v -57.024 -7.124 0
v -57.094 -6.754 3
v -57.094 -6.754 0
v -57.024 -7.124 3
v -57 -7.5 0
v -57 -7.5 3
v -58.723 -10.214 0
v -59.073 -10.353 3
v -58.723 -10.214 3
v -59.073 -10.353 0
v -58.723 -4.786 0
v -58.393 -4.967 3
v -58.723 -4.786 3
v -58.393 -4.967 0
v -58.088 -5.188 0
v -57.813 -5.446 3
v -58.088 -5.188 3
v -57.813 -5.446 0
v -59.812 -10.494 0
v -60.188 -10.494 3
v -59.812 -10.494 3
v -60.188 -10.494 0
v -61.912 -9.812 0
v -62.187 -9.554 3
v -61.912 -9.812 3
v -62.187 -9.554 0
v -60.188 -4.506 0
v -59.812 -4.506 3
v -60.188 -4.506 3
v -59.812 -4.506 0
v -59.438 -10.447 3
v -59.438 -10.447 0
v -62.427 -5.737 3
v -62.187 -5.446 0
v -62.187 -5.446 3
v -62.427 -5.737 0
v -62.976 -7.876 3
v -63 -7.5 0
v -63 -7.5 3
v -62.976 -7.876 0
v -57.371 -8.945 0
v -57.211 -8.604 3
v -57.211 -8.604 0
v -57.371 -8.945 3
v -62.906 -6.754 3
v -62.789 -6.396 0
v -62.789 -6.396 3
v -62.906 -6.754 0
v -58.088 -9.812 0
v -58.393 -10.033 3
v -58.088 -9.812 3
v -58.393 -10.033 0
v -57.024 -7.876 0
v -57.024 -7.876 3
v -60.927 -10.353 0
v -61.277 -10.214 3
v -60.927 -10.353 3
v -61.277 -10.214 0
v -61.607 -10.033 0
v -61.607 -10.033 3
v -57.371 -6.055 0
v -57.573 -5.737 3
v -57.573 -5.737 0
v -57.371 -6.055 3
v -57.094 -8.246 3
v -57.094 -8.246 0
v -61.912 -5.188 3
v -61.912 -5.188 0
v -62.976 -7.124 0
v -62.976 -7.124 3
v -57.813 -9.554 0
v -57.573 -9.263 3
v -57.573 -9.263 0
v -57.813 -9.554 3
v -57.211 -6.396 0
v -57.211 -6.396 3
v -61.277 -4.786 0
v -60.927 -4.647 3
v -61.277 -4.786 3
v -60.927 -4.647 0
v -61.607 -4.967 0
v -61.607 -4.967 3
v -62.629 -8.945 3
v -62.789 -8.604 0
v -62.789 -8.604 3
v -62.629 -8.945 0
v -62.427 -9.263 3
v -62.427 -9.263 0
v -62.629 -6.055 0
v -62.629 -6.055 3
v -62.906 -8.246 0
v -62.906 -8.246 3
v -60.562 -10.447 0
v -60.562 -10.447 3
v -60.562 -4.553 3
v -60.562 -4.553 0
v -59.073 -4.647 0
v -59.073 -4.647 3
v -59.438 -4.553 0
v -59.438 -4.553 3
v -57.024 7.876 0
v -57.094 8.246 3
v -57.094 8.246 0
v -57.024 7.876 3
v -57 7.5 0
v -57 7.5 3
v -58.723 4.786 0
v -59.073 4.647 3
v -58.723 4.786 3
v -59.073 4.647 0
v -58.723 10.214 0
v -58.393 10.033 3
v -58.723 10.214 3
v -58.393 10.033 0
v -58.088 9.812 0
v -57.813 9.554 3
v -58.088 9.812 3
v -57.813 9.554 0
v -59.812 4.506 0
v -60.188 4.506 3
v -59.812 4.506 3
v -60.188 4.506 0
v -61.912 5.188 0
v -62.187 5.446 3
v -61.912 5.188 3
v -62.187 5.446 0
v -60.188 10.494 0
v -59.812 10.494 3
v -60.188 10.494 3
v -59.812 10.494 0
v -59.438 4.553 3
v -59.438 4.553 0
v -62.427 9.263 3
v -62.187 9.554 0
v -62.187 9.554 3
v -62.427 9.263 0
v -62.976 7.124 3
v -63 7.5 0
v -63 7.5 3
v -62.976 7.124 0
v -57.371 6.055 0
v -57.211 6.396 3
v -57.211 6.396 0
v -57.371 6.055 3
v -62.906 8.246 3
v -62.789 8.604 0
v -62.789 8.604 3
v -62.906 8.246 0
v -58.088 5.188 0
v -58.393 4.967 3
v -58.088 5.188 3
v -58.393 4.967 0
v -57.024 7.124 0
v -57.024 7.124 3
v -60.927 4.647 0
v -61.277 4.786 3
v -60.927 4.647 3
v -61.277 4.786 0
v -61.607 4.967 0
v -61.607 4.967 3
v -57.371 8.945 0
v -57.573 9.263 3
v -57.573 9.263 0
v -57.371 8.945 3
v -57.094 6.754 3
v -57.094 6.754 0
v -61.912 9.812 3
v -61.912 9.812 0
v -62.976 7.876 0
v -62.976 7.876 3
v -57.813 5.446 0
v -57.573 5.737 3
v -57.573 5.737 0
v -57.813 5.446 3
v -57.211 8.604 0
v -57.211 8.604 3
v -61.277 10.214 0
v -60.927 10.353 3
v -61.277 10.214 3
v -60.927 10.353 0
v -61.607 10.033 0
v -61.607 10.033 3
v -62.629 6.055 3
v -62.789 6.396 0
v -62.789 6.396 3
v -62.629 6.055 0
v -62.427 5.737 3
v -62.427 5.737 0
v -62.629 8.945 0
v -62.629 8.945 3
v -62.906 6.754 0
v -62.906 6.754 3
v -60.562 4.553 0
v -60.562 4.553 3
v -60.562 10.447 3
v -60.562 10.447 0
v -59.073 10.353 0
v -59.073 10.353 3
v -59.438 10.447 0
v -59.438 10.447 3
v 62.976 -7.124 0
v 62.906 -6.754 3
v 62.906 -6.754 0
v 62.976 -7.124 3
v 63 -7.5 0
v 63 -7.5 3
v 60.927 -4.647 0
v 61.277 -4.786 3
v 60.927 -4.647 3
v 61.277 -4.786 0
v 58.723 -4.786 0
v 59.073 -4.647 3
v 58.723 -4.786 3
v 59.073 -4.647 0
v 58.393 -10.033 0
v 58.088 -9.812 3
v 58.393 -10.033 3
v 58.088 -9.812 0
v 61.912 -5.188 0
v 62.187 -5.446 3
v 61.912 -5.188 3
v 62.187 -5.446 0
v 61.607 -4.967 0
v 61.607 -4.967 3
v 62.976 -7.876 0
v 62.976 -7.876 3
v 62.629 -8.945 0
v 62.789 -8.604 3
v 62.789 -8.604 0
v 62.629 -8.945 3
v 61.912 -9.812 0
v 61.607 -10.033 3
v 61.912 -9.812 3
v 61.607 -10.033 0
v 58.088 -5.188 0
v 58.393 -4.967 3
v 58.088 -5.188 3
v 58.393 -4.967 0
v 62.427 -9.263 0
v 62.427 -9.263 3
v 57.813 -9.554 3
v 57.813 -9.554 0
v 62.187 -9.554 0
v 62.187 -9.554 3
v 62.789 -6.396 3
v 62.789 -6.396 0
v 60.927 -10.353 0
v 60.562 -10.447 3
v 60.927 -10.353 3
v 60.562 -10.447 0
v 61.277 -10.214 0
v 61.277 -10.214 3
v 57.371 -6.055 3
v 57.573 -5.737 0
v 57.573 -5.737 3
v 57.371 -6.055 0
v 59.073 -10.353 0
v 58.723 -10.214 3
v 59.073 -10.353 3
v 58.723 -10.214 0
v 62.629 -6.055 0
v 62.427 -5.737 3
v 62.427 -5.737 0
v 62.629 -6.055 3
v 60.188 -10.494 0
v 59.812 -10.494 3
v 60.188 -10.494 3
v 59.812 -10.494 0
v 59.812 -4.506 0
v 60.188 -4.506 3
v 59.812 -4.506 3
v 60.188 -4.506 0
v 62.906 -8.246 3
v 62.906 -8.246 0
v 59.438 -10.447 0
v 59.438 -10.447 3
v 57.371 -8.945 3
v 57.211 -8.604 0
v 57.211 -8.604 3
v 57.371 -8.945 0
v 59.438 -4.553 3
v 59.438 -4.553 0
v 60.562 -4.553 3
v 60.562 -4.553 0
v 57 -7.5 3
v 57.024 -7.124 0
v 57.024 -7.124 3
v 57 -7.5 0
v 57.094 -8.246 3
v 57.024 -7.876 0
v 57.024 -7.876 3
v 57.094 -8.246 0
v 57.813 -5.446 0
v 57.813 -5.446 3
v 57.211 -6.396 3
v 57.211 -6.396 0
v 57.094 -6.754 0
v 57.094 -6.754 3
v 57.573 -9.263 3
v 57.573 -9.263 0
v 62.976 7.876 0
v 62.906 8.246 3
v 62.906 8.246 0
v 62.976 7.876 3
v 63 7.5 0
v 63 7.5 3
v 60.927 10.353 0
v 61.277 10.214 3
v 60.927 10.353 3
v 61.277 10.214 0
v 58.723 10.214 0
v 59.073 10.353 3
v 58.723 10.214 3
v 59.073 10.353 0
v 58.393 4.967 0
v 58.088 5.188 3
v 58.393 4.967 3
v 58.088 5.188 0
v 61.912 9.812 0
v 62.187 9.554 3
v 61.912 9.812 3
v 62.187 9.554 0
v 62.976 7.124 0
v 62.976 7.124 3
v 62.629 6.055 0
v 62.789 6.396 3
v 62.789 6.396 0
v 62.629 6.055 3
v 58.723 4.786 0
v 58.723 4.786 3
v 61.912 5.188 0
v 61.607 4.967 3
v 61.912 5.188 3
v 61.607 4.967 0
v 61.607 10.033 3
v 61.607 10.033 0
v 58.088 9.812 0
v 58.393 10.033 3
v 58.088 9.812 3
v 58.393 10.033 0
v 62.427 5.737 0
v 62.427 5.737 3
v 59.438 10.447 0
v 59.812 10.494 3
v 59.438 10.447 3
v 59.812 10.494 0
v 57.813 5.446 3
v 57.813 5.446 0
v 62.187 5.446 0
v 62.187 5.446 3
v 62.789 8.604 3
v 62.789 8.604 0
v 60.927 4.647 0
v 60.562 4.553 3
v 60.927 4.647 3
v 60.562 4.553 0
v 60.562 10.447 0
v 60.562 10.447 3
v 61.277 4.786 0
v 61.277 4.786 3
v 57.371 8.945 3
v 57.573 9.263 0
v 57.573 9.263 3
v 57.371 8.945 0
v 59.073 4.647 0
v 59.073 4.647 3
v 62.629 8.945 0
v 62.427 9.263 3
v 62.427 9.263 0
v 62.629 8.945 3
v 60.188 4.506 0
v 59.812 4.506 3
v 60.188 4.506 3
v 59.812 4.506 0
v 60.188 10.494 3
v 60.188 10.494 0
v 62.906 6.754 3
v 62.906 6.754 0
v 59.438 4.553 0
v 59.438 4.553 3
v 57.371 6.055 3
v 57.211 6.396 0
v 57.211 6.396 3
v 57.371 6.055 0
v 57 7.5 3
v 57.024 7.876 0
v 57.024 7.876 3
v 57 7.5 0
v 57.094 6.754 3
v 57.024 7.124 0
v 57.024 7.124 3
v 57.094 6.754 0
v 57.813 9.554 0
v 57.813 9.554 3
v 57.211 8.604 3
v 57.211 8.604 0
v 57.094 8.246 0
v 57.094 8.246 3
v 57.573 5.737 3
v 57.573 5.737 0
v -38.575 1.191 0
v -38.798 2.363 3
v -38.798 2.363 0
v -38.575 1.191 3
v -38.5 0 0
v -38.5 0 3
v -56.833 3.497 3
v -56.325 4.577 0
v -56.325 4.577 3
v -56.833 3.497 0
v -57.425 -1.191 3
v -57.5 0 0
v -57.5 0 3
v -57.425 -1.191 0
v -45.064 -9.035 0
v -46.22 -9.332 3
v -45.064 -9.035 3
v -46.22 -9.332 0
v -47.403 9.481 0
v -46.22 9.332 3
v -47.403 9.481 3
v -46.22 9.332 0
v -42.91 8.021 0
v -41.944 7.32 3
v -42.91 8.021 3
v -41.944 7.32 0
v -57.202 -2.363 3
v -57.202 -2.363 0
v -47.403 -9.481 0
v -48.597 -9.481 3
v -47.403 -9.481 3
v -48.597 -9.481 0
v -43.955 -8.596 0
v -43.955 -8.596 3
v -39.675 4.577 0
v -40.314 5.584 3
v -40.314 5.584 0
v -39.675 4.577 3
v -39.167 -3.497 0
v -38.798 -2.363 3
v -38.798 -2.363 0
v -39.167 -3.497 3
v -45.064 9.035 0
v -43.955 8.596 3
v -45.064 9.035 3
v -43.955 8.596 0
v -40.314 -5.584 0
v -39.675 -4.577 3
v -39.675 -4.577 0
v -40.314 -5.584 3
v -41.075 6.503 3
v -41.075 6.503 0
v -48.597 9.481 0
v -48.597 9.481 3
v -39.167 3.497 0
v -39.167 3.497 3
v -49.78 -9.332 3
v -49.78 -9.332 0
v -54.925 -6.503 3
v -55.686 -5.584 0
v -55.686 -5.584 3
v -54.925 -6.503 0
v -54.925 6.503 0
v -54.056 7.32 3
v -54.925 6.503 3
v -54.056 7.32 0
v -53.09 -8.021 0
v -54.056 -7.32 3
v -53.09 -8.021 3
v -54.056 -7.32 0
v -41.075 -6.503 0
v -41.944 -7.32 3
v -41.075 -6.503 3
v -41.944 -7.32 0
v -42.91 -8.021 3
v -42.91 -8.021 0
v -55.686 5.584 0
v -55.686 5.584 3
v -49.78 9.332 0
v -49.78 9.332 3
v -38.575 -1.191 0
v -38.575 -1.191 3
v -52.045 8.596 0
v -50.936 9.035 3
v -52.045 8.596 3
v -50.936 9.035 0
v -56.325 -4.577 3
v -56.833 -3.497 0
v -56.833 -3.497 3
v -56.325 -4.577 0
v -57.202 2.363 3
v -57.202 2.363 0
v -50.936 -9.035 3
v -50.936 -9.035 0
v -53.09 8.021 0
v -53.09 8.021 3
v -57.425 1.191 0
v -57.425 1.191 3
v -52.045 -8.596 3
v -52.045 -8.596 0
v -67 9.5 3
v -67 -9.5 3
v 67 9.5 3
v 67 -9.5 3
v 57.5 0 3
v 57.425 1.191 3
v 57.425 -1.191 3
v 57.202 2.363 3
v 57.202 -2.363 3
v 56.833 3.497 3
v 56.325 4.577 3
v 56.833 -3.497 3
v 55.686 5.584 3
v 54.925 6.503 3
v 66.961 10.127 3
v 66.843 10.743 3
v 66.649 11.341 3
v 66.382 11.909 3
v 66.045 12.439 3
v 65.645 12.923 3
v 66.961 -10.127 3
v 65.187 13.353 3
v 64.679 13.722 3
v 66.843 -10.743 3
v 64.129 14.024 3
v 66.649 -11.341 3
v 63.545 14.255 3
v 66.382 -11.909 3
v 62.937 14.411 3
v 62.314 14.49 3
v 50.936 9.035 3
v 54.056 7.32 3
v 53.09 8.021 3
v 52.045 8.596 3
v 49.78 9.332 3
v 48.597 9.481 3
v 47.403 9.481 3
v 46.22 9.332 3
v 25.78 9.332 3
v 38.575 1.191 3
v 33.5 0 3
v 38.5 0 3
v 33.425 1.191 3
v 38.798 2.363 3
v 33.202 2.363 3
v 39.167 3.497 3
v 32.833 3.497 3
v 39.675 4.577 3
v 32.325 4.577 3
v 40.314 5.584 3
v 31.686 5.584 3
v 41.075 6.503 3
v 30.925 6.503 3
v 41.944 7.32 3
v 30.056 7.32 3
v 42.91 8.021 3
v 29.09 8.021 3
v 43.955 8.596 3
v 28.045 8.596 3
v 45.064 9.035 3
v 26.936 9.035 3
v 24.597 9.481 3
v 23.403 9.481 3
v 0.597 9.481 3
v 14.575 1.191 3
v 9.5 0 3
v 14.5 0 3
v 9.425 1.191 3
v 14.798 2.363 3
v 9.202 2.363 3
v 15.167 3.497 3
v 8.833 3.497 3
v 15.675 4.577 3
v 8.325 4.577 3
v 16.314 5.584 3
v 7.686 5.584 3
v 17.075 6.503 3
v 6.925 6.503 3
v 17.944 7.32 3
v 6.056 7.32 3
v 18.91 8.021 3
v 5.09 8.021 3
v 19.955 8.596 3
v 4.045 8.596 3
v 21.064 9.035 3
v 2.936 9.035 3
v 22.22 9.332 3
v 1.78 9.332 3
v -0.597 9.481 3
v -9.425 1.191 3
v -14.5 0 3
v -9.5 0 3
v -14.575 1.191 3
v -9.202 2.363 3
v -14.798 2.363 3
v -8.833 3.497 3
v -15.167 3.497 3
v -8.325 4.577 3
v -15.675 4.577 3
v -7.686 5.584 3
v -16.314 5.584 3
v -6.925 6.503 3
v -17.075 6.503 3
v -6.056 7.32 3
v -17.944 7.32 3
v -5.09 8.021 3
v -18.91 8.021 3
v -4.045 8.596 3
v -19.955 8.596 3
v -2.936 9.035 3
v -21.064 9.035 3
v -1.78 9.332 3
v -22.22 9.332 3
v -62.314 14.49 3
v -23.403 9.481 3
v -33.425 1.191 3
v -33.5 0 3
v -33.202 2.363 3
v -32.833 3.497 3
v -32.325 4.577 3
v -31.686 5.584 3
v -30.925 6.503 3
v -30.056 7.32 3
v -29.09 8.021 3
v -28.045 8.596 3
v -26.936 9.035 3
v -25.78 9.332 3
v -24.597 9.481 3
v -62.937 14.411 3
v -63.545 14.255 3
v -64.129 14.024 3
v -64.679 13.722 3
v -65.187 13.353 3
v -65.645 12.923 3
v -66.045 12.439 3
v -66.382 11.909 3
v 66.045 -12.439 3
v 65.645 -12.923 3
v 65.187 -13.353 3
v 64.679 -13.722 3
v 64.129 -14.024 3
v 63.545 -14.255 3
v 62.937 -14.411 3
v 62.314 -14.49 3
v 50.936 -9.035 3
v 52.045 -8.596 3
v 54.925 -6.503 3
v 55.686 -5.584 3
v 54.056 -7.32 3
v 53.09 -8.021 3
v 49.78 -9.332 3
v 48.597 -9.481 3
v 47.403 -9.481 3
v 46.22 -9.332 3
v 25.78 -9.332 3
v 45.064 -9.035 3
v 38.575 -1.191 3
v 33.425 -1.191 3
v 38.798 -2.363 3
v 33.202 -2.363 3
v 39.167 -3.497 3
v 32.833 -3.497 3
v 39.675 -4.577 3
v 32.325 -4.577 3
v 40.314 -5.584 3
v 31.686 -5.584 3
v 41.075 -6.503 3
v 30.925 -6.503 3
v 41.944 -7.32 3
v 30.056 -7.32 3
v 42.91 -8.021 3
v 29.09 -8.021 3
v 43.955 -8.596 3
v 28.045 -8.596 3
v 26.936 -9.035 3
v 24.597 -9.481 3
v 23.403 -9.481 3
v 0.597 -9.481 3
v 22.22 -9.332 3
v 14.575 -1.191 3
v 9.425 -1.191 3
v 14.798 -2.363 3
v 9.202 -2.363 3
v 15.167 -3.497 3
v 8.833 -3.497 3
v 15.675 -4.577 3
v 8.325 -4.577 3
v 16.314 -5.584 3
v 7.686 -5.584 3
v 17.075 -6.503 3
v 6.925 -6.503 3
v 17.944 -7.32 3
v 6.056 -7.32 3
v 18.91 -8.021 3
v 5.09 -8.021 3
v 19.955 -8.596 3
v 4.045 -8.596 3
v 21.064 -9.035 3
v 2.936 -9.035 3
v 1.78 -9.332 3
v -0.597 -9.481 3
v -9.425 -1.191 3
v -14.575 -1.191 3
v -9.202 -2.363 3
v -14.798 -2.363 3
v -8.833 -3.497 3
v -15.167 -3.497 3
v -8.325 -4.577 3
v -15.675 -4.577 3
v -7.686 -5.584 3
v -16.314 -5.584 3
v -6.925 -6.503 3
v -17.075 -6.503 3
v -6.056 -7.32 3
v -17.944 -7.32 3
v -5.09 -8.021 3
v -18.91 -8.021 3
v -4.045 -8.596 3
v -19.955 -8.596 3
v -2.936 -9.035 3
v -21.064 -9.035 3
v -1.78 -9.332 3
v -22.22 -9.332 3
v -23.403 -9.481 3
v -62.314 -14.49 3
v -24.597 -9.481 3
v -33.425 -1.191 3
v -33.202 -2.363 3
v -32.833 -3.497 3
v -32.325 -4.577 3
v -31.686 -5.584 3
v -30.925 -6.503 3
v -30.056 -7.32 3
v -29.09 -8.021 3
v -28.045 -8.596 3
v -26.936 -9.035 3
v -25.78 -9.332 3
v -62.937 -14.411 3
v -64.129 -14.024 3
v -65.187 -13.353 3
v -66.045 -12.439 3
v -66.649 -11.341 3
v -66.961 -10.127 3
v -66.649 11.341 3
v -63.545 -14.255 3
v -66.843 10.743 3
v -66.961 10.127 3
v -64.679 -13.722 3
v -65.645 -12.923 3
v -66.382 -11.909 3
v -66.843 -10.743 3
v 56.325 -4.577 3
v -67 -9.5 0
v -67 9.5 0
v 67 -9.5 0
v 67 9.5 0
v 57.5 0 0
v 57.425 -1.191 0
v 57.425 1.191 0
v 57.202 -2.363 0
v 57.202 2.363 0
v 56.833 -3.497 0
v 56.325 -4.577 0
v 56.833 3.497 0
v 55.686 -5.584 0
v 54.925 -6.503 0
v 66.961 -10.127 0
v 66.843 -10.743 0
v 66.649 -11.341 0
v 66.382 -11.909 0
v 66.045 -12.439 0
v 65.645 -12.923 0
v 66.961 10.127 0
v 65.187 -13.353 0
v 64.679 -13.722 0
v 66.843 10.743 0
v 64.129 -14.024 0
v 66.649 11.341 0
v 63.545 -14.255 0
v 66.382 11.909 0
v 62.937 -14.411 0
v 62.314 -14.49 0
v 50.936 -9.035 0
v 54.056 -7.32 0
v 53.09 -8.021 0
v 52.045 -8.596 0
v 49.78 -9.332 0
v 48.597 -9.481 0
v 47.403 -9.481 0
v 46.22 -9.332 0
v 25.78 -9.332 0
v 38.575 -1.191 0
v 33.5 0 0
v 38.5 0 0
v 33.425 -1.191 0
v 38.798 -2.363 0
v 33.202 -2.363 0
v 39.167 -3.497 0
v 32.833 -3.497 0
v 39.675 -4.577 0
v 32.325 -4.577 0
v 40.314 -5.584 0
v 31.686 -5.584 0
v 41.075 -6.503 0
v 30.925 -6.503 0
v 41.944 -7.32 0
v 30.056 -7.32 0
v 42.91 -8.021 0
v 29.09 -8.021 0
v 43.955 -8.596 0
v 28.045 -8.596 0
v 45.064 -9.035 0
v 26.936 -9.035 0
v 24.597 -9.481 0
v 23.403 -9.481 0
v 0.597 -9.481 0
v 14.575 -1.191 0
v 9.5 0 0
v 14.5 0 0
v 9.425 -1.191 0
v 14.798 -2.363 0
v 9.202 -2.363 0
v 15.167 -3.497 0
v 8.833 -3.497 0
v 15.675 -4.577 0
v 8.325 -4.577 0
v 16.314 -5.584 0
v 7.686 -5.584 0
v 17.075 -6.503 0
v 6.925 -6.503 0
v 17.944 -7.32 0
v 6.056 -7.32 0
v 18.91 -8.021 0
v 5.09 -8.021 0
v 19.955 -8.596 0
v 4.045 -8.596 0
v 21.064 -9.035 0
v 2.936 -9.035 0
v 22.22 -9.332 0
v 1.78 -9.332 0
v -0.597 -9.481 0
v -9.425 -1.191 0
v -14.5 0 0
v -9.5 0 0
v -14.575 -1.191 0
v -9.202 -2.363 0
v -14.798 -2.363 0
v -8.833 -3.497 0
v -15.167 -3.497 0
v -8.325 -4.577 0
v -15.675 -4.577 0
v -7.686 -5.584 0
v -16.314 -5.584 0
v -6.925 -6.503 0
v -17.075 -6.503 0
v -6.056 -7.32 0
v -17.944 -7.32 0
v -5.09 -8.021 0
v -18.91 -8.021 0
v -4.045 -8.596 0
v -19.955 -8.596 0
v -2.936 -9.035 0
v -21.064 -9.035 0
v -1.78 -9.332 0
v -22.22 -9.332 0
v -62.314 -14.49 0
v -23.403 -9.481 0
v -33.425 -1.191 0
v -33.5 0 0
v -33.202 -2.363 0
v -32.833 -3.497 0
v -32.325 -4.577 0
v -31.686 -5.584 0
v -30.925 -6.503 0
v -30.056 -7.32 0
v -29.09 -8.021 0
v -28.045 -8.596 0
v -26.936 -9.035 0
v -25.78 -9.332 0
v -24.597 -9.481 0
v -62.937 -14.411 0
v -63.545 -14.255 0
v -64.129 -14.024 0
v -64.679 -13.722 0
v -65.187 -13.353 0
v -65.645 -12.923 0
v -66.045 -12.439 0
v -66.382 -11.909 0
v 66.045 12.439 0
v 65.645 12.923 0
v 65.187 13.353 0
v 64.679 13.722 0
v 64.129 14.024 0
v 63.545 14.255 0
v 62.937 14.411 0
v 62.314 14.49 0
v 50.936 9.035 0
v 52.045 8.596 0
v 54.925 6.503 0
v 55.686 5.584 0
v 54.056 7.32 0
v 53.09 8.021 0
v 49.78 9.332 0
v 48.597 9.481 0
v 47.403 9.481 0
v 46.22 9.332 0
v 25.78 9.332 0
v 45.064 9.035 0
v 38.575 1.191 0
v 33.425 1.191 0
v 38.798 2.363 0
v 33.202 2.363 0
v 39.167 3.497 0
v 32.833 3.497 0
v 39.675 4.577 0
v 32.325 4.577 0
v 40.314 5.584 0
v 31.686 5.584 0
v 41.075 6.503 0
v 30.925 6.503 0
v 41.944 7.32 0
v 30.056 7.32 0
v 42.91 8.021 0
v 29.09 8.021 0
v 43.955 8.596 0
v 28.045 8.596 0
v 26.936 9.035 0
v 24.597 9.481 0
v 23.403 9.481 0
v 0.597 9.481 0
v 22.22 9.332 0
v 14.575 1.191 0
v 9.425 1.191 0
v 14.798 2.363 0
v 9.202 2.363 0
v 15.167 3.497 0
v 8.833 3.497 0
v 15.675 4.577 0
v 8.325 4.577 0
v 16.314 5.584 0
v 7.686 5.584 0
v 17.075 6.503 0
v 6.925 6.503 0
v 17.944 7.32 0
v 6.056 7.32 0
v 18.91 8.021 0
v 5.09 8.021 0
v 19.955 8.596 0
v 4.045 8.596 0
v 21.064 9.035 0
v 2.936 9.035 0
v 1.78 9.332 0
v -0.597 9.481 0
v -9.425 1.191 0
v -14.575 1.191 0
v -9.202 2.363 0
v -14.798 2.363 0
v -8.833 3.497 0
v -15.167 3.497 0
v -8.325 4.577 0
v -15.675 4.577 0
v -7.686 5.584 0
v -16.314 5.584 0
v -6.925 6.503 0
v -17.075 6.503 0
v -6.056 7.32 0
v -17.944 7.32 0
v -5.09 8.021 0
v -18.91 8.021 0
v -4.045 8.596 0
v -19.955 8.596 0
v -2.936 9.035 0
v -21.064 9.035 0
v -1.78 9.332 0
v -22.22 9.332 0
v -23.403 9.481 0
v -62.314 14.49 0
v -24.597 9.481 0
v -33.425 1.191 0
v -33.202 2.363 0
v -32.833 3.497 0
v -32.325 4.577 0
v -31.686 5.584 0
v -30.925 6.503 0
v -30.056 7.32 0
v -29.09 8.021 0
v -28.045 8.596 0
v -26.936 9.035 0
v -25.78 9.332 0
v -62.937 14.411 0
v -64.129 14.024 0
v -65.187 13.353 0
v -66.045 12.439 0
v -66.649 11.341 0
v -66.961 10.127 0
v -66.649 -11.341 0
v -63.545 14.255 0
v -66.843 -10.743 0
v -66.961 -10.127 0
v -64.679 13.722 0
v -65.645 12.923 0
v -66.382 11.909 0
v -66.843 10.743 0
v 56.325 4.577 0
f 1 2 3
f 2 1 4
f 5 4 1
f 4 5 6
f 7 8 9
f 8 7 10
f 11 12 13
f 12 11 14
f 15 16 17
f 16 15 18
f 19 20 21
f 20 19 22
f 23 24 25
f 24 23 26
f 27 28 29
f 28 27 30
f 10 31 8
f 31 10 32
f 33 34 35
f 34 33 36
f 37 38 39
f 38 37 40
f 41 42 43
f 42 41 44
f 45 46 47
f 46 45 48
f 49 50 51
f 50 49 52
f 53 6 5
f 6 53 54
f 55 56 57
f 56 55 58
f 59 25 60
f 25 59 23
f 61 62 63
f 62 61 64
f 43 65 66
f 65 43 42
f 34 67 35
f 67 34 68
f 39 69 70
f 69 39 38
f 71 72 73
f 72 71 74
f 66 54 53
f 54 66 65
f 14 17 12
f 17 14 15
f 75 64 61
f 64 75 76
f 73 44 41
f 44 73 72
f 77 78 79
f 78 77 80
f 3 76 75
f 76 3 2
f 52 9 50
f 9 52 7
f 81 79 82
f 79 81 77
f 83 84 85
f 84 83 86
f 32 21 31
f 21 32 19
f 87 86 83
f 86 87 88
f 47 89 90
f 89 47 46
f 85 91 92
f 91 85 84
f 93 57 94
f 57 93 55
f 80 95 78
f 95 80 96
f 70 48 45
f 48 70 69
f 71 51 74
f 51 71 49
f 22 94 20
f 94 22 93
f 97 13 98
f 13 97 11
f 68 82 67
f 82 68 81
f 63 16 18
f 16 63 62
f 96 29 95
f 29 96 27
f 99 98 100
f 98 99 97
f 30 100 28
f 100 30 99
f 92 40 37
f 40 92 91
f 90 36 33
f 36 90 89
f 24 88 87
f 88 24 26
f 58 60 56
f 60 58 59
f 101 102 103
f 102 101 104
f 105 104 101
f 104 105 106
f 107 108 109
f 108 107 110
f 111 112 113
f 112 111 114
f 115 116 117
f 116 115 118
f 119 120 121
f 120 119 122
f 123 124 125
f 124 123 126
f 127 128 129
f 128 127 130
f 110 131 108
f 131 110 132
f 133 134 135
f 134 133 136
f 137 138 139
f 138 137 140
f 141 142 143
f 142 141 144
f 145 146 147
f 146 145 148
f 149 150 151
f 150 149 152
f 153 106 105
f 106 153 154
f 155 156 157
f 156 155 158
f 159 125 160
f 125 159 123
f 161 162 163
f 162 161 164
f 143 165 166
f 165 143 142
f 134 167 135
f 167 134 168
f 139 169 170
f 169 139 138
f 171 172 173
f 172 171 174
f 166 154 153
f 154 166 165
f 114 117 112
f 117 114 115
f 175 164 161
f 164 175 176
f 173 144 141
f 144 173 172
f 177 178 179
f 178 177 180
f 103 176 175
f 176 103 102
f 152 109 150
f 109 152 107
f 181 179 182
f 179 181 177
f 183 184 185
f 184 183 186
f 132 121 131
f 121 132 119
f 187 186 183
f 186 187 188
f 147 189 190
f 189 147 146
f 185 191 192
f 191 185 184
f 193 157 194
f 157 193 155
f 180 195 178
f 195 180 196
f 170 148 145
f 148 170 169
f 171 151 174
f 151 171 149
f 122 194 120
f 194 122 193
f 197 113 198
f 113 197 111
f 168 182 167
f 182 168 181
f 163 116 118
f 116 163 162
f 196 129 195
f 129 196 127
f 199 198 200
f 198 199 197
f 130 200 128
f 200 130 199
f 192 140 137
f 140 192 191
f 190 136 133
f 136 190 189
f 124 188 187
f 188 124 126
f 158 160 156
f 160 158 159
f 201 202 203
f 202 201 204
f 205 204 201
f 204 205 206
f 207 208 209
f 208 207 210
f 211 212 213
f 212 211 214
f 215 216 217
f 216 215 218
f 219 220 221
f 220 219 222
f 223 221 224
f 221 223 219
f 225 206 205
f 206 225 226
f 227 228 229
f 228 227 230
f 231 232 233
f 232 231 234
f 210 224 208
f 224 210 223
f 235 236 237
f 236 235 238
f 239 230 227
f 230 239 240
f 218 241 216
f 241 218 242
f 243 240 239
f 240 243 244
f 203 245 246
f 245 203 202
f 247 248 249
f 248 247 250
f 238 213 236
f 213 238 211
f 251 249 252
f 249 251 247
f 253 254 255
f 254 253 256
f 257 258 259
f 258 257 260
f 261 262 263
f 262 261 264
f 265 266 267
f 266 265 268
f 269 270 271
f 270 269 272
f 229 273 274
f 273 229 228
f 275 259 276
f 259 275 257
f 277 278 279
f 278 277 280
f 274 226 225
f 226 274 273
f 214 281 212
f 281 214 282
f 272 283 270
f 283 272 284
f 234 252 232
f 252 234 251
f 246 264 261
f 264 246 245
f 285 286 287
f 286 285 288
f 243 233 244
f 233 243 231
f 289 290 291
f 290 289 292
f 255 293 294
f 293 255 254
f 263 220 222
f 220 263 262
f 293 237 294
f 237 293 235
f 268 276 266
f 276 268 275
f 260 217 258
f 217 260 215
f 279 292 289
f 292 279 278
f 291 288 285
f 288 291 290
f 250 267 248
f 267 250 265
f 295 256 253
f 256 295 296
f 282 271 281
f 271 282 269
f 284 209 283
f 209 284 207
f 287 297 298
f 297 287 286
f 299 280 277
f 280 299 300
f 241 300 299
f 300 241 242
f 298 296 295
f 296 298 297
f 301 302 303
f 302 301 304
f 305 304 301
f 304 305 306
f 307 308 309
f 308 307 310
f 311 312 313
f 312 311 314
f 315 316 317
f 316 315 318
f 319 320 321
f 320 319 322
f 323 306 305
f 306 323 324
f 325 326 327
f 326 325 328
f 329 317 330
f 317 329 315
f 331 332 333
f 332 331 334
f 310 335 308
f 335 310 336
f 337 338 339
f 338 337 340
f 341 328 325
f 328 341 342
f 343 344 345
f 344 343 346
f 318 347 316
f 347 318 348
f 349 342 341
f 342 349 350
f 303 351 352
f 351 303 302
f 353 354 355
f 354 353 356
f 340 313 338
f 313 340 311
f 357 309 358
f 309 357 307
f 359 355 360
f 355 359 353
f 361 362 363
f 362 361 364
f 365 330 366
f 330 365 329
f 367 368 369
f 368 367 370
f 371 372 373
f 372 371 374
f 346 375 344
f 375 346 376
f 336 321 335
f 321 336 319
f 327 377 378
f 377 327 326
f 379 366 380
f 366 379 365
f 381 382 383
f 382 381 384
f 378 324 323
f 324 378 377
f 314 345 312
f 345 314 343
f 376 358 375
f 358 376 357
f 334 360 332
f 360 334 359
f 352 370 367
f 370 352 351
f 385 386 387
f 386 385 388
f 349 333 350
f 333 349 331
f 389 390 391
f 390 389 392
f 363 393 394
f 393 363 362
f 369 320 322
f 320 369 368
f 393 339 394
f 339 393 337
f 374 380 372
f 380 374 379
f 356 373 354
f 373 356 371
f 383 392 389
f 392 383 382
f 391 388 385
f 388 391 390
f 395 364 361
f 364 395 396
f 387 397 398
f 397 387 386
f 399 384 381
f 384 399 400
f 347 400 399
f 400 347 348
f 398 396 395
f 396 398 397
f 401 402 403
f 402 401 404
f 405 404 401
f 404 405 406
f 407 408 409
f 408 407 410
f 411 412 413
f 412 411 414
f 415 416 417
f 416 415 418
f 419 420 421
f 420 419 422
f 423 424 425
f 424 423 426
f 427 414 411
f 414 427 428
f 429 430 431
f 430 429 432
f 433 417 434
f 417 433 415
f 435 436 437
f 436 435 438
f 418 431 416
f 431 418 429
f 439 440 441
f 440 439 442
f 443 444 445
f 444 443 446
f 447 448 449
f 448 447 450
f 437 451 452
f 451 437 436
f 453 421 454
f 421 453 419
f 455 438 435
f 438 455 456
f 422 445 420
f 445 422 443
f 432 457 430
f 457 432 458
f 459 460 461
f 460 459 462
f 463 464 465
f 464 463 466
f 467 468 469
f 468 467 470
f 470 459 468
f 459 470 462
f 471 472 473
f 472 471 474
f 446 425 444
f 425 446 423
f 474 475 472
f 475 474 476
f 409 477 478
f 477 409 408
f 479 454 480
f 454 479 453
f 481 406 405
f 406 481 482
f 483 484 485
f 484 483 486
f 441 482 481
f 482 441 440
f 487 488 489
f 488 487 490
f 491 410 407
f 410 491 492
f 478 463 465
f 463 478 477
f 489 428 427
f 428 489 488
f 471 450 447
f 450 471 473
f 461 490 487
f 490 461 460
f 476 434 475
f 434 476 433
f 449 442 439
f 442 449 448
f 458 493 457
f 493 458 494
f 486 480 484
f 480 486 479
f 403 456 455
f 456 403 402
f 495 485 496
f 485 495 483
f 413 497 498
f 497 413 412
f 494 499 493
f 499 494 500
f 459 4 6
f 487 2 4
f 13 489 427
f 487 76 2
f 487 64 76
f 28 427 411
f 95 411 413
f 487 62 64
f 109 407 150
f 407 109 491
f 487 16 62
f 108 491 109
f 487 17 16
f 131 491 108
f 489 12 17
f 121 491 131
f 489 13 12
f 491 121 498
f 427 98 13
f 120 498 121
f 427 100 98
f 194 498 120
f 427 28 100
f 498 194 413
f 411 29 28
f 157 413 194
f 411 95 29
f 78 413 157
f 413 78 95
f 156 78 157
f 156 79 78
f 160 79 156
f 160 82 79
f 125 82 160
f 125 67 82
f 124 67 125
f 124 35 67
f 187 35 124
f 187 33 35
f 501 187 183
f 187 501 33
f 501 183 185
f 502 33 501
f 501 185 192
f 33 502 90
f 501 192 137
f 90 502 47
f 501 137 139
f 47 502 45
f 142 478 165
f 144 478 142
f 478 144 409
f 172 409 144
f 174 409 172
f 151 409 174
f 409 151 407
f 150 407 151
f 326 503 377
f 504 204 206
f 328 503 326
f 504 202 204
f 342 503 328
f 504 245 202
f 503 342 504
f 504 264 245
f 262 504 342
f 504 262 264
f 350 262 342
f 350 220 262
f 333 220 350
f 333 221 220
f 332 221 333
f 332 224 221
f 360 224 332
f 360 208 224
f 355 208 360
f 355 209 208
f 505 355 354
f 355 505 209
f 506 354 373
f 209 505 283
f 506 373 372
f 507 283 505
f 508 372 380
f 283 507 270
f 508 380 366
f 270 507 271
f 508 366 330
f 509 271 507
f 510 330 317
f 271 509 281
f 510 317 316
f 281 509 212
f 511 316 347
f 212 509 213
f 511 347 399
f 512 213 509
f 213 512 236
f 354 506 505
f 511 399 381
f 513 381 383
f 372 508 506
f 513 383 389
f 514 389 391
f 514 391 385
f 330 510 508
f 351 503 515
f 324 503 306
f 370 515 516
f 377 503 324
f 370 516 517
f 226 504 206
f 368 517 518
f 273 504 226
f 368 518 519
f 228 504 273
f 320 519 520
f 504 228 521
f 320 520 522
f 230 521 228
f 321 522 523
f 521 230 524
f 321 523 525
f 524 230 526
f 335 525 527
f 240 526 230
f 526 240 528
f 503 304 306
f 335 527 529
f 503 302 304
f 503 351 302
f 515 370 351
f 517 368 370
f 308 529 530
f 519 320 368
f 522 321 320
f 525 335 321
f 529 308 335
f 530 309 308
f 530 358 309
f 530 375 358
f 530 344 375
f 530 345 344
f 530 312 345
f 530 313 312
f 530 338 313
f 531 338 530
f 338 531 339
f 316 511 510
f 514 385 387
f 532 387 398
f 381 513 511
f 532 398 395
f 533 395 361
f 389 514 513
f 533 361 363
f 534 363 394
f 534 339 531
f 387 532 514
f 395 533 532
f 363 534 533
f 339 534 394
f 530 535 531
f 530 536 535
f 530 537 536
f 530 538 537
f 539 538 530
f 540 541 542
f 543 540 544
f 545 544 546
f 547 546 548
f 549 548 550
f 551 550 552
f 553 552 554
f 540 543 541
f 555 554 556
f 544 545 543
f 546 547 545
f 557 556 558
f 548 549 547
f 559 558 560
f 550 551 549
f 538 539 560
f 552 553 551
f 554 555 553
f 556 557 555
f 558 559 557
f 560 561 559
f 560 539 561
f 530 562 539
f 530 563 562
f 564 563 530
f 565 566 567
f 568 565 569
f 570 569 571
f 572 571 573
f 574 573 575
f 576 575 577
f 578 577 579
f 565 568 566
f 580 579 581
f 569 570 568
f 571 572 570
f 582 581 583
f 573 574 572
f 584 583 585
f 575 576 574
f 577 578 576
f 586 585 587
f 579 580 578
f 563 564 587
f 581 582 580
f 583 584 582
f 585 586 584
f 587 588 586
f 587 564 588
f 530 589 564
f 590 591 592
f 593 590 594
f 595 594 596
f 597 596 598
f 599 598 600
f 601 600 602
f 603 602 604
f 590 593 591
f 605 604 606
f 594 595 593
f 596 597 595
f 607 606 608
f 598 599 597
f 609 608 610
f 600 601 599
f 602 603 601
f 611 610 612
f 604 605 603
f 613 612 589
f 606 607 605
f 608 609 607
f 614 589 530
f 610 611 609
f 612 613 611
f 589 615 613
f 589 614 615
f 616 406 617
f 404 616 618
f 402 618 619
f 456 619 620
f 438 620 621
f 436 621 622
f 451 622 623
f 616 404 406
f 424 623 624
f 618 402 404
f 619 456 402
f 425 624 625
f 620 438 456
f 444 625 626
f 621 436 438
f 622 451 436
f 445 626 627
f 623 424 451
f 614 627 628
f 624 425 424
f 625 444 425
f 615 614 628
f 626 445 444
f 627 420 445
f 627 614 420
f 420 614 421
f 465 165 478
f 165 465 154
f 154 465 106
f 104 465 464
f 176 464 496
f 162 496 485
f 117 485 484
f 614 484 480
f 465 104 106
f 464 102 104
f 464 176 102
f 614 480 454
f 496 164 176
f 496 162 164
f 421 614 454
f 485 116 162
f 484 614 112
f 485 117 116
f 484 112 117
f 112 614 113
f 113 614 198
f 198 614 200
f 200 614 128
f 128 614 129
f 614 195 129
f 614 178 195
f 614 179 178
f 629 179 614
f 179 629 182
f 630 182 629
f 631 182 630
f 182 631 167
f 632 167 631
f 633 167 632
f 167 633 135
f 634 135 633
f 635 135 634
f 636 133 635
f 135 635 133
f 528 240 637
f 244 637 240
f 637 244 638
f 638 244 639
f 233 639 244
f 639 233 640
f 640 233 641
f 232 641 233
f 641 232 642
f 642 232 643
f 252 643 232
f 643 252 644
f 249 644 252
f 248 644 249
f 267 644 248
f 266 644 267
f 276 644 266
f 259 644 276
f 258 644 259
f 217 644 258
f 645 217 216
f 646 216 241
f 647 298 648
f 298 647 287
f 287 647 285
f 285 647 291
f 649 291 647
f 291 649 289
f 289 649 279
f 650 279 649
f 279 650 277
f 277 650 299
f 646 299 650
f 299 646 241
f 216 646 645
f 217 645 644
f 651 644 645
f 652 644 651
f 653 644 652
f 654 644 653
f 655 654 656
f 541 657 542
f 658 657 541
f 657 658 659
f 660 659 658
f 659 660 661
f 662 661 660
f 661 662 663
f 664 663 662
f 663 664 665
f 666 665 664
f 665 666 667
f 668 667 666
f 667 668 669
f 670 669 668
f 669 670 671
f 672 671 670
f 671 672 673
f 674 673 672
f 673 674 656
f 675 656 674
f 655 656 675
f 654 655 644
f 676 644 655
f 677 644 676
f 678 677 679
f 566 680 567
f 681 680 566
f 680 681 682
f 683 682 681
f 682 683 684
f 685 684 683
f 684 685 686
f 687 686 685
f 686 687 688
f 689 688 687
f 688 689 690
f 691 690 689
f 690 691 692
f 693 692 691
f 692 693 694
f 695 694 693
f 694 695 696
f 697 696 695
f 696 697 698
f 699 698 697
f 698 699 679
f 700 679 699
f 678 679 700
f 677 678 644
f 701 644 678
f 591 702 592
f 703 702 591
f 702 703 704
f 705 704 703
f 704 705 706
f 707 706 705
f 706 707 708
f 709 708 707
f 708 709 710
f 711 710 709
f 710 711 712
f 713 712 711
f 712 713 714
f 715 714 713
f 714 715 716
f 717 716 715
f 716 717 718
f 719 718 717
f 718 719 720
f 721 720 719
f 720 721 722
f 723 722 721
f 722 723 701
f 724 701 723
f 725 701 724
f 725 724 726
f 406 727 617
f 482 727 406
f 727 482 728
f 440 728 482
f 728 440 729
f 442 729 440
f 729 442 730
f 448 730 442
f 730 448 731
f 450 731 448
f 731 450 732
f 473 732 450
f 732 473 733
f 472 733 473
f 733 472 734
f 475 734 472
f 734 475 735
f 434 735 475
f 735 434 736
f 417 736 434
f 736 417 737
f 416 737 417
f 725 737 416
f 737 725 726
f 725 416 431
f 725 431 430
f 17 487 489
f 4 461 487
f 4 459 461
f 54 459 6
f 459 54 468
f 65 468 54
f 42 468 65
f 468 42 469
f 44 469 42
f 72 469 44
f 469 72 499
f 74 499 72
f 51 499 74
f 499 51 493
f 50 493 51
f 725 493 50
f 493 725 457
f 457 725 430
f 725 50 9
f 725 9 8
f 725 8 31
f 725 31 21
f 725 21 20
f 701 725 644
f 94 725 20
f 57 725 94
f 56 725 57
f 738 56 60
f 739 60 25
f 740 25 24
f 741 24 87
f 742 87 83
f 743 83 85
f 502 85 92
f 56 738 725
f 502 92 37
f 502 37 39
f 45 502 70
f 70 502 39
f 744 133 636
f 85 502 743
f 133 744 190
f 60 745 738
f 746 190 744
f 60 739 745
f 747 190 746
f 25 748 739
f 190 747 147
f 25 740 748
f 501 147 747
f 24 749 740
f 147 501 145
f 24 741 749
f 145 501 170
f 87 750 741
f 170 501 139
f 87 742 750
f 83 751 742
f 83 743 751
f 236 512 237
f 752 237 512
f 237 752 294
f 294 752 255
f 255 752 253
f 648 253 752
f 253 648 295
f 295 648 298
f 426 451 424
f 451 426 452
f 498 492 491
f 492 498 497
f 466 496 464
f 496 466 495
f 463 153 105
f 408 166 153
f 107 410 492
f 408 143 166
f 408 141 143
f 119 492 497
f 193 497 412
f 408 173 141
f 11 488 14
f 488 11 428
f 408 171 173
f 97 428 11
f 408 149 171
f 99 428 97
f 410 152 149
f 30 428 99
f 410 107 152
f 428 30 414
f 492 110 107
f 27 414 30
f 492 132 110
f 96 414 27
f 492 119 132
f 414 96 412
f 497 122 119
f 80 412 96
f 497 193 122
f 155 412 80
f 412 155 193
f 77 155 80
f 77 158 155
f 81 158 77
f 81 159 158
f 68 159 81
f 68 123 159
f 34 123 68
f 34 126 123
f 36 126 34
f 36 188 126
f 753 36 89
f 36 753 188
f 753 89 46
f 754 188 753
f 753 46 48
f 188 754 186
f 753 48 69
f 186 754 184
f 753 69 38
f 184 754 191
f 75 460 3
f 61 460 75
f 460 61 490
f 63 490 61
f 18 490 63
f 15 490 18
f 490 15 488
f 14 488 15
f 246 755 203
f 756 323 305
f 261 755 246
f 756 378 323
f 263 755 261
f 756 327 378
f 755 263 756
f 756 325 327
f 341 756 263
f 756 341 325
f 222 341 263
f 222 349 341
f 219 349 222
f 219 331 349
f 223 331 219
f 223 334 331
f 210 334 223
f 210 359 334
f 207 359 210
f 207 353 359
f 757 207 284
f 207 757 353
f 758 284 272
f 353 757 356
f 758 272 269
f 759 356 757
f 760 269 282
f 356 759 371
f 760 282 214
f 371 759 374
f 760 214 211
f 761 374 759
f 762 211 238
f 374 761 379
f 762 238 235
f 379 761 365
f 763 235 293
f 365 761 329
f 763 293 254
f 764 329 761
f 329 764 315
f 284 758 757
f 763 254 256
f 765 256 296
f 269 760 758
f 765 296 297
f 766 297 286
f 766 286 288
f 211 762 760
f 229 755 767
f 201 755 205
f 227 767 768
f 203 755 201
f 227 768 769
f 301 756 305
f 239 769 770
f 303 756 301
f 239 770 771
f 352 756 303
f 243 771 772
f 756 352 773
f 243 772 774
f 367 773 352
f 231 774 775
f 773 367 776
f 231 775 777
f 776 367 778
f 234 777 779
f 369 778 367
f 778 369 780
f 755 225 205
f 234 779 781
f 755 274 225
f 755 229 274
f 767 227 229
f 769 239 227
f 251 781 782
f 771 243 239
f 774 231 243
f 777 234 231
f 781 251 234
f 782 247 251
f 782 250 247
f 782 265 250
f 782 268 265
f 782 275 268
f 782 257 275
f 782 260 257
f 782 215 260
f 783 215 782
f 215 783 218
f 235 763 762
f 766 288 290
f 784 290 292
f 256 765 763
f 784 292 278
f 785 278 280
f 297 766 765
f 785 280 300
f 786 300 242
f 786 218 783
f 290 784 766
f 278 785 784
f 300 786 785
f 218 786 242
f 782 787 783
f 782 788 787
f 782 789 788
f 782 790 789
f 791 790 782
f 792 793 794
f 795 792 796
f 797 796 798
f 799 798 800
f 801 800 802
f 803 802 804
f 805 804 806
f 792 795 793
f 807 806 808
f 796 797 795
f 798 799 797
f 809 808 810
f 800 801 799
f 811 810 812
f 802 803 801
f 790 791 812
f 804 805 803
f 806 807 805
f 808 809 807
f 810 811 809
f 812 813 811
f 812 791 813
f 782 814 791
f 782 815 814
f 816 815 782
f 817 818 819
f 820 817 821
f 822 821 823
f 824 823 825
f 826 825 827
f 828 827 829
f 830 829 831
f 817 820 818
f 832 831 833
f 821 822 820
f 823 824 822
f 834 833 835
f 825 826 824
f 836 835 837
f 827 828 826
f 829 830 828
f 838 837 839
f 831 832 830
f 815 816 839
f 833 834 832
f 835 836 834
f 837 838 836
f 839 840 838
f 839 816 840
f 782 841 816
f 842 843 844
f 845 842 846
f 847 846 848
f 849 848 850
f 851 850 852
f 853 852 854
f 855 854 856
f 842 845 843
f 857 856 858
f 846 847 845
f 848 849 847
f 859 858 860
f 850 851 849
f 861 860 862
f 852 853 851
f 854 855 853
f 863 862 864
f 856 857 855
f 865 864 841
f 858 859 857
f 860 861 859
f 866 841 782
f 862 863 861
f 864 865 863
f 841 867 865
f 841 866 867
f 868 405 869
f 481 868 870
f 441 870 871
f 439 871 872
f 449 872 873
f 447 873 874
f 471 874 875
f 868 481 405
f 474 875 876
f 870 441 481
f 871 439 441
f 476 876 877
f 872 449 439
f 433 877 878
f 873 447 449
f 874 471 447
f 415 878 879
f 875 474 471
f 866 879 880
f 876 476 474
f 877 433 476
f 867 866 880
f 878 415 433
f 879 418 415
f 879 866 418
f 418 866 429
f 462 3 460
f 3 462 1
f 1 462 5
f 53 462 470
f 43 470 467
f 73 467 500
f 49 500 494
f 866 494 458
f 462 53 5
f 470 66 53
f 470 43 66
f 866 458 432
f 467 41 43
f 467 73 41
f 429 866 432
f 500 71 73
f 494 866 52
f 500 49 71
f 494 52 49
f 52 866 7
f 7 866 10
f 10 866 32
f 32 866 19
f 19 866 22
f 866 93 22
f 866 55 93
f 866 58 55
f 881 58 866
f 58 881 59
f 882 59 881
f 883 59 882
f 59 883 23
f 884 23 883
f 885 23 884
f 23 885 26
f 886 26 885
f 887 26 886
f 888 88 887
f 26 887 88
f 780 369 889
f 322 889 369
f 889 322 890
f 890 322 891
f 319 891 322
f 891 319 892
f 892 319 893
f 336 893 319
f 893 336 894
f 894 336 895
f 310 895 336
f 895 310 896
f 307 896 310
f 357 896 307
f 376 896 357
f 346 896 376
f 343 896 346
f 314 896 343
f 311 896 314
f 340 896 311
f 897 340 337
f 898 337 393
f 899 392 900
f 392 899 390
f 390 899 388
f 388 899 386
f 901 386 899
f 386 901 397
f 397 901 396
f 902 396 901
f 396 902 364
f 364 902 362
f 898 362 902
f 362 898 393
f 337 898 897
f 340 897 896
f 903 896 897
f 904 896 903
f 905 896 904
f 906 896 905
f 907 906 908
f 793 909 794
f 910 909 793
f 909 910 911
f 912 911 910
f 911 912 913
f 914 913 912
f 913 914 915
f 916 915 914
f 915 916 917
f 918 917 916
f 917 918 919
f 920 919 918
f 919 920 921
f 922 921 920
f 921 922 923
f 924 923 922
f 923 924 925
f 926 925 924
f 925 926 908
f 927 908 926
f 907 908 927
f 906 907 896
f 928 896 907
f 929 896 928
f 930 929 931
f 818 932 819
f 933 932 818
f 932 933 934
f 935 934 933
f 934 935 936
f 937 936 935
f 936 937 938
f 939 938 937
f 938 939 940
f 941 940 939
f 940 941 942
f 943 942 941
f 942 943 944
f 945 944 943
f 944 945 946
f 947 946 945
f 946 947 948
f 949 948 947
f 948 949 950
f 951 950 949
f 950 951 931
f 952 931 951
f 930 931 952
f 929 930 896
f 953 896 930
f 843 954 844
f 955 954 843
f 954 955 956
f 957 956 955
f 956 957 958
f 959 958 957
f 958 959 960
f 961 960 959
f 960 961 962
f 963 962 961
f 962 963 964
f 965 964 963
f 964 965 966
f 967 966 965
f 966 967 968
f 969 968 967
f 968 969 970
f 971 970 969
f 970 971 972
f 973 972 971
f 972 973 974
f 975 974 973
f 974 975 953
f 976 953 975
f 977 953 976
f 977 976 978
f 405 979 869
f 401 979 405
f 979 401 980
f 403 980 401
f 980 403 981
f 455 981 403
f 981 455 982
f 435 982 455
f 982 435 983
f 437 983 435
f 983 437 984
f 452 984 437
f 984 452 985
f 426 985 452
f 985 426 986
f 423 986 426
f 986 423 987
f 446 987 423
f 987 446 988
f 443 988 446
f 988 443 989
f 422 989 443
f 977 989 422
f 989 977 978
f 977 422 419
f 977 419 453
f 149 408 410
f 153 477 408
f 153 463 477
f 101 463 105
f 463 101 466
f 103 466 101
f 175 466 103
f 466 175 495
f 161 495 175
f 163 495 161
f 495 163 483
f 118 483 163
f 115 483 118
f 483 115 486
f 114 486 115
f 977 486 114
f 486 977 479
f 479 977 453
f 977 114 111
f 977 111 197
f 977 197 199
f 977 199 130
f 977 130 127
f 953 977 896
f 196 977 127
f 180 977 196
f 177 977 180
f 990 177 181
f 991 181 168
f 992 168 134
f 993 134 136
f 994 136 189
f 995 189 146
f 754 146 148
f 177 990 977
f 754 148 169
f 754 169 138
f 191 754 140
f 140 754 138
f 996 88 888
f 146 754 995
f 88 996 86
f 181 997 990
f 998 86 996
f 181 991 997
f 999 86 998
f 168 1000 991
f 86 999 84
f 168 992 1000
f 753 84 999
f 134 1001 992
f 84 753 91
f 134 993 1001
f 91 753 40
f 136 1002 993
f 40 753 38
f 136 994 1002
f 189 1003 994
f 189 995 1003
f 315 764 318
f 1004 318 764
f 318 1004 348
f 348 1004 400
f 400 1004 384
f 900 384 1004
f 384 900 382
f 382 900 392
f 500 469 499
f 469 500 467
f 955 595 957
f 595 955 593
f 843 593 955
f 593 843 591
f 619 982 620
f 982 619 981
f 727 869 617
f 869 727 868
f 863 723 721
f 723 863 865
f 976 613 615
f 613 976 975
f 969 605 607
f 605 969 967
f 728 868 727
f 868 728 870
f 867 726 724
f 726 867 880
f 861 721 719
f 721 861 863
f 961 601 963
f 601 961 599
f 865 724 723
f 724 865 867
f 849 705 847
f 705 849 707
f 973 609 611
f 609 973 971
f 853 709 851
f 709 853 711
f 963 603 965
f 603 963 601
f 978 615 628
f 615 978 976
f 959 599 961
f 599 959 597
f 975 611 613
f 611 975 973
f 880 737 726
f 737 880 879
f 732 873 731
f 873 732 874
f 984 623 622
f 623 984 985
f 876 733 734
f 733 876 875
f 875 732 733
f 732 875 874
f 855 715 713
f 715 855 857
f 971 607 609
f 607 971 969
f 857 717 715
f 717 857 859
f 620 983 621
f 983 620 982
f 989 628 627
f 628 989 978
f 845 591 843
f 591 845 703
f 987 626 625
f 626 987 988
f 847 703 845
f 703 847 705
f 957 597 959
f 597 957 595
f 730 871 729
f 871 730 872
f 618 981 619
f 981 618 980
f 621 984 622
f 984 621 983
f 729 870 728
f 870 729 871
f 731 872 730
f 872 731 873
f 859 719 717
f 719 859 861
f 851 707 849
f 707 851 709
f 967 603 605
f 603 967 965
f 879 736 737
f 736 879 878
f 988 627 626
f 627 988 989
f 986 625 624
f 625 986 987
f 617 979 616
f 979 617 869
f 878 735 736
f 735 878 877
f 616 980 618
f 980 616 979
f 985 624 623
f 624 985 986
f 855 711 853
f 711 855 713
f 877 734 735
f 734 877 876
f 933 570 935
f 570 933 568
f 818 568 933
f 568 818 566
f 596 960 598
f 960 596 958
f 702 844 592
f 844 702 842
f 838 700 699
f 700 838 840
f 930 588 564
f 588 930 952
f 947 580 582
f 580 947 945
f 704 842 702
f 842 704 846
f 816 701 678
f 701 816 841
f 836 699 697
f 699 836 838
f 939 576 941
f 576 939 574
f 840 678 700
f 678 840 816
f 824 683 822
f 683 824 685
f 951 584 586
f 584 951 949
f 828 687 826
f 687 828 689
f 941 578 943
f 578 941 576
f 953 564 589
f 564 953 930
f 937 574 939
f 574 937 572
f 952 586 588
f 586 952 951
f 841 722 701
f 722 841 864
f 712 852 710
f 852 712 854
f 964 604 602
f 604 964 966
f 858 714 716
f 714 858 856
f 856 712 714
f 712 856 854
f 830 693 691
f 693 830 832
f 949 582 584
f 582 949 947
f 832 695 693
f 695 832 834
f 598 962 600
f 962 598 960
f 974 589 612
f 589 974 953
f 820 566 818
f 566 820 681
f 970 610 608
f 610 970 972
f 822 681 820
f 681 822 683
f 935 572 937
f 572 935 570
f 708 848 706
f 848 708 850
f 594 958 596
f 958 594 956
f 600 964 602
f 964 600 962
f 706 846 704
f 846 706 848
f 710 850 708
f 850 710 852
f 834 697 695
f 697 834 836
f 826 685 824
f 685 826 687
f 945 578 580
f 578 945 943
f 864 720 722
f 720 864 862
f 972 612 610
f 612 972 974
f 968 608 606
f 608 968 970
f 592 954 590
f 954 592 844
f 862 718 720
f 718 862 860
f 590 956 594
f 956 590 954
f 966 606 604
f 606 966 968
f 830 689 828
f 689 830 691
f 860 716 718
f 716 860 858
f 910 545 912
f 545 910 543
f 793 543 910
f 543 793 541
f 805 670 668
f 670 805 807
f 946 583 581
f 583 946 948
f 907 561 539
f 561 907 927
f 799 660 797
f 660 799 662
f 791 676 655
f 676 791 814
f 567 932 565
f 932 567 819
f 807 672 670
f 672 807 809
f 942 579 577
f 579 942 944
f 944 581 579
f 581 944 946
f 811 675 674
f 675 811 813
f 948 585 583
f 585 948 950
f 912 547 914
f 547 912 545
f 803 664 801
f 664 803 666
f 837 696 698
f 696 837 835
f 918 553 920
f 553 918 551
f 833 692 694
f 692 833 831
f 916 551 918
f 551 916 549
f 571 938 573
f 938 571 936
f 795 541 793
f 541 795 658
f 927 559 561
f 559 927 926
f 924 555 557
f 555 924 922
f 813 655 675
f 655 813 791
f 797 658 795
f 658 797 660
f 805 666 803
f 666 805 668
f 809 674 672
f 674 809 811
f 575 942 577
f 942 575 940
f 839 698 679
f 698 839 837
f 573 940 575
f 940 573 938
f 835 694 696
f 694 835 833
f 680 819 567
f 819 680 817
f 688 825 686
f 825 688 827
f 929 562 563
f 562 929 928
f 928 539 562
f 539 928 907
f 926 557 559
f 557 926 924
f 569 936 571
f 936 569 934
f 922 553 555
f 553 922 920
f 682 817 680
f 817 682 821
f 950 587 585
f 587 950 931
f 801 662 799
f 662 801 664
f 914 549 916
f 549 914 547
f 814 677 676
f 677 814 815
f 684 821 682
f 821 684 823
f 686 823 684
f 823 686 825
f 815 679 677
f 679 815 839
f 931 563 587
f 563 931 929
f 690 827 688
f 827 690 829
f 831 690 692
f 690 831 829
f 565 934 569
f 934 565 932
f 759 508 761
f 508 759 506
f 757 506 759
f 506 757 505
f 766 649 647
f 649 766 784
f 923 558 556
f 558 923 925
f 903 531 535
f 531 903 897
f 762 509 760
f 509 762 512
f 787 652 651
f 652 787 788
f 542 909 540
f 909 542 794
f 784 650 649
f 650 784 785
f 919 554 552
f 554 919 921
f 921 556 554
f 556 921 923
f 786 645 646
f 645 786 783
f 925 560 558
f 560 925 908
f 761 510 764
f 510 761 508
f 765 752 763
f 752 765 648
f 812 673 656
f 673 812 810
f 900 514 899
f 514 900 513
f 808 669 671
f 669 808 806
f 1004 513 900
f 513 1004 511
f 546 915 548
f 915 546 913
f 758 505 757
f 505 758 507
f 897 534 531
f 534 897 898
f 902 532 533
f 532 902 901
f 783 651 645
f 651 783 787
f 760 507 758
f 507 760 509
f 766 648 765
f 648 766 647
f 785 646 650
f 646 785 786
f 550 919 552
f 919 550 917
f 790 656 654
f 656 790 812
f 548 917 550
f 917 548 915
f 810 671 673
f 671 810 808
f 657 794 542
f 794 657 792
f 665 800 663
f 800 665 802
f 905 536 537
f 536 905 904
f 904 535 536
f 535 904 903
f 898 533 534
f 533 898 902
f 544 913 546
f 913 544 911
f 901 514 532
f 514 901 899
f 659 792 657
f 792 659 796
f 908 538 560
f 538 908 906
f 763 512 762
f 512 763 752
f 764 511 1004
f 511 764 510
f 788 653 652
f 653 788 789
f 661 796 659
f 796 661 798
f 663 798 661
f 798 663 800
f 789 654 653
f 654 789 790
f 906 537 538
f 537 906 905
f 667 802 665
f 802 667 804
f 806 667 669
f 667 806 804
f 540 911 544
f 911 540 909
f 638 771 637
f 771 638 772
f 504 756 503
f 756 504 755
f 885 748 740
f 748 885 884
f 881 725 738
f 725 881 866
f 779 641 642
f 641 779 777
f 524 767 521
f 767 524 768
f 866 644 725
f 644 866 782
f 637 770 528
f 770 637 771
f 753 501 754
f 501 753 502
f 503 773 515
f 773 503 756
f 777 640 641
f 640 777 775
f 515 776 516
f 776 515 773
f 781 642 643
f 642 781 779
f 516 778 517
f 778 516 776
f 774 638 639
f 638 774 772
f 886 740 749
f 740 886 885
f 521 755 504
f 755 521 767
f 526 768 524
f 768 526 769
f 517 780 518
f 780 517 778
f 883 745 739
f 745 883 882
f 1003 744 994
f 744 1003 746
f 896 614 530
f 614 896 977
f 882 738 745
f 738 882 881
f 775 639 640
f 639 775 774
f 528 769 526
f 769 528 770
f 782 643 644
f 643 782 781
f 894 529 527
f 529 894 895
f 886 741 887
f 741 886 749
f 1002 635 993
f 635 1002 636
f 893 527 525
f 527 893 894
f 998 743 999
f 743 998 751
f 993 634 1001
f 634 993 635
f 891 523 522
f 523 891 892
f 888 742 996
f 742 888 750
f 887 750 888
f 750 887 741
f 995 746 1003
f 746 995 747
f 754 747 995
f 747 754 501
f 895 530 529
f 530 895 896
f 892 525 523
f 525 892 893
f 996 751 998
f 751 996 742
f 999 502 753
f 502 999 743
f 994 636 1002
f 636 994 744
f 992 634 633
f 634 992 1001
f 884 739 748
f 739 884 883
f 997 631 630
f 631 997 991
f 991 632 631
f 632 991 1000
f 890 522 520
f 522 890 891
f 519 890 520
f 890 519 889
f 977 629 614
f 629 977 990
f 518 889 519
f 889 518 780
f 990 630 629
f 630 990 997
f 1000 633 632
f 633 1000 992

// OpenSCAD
$fn = 50;


difference() {
	union() {
		hull() {
			translate(v = [-62.0000000000, 9.5000000000, 0]) {
				cylinder(h = 3, r = 5);
			}
			translate(v = [62.0000000000, 9.5000000000, 0]) {
				cylinder(h = 3, r = 5);
			}
			translate(v = [-62.0000000000, -9.5000000000, 0]) {
				cylinder(h = 3, r = 5);
			}
			translate(v = [62.0000000000, -9.5000000000, 0]) {
				cylinder(h = 3, r = 5);
			}
		}
	}
	union() {
		#translate(v = [-60.0000000000, -7.5000000000, -100.0000000000]) {
			cylinder(h = 200, r = 3.0000000000);
		}
		#translate(v = [-60.0000000000, 7.5000000000, -100.0000000000]) {
			cylinder(h = 200, r = 3.0000000000);
		}
		#translate(v = [60.0000000000, -7.5000000000, -100.0000000000]) {
			cylinder(h = 200, r = 3.0000000000);
		}
		#translate(v = [60.0000000000, 7.5000000000, -100.0000000000]) {
			cylinder(h = 200, r = 3.0000000000);
		}
		#translate(v = [-48.0000000000, 0, 0]) {
			cylinder(h = 3, r = 9.5000000000);
		}
		#translate(v = [-24.0000000000, 0, 0]) {
			cylinder(h = 3, r = 9.5000000000);
		}
		#cylinder(h = 3, r = 9.5000000000);
		#translate(v = [24.0000000000, 0, 0]) {
			cylinder(h = 3, r = 9.5000000000);
		}
		#translate(v = [48.0000000000, 0, 0]) {
			cylinder(h = 3, r = 9.5000000000);
		}
	}
}
